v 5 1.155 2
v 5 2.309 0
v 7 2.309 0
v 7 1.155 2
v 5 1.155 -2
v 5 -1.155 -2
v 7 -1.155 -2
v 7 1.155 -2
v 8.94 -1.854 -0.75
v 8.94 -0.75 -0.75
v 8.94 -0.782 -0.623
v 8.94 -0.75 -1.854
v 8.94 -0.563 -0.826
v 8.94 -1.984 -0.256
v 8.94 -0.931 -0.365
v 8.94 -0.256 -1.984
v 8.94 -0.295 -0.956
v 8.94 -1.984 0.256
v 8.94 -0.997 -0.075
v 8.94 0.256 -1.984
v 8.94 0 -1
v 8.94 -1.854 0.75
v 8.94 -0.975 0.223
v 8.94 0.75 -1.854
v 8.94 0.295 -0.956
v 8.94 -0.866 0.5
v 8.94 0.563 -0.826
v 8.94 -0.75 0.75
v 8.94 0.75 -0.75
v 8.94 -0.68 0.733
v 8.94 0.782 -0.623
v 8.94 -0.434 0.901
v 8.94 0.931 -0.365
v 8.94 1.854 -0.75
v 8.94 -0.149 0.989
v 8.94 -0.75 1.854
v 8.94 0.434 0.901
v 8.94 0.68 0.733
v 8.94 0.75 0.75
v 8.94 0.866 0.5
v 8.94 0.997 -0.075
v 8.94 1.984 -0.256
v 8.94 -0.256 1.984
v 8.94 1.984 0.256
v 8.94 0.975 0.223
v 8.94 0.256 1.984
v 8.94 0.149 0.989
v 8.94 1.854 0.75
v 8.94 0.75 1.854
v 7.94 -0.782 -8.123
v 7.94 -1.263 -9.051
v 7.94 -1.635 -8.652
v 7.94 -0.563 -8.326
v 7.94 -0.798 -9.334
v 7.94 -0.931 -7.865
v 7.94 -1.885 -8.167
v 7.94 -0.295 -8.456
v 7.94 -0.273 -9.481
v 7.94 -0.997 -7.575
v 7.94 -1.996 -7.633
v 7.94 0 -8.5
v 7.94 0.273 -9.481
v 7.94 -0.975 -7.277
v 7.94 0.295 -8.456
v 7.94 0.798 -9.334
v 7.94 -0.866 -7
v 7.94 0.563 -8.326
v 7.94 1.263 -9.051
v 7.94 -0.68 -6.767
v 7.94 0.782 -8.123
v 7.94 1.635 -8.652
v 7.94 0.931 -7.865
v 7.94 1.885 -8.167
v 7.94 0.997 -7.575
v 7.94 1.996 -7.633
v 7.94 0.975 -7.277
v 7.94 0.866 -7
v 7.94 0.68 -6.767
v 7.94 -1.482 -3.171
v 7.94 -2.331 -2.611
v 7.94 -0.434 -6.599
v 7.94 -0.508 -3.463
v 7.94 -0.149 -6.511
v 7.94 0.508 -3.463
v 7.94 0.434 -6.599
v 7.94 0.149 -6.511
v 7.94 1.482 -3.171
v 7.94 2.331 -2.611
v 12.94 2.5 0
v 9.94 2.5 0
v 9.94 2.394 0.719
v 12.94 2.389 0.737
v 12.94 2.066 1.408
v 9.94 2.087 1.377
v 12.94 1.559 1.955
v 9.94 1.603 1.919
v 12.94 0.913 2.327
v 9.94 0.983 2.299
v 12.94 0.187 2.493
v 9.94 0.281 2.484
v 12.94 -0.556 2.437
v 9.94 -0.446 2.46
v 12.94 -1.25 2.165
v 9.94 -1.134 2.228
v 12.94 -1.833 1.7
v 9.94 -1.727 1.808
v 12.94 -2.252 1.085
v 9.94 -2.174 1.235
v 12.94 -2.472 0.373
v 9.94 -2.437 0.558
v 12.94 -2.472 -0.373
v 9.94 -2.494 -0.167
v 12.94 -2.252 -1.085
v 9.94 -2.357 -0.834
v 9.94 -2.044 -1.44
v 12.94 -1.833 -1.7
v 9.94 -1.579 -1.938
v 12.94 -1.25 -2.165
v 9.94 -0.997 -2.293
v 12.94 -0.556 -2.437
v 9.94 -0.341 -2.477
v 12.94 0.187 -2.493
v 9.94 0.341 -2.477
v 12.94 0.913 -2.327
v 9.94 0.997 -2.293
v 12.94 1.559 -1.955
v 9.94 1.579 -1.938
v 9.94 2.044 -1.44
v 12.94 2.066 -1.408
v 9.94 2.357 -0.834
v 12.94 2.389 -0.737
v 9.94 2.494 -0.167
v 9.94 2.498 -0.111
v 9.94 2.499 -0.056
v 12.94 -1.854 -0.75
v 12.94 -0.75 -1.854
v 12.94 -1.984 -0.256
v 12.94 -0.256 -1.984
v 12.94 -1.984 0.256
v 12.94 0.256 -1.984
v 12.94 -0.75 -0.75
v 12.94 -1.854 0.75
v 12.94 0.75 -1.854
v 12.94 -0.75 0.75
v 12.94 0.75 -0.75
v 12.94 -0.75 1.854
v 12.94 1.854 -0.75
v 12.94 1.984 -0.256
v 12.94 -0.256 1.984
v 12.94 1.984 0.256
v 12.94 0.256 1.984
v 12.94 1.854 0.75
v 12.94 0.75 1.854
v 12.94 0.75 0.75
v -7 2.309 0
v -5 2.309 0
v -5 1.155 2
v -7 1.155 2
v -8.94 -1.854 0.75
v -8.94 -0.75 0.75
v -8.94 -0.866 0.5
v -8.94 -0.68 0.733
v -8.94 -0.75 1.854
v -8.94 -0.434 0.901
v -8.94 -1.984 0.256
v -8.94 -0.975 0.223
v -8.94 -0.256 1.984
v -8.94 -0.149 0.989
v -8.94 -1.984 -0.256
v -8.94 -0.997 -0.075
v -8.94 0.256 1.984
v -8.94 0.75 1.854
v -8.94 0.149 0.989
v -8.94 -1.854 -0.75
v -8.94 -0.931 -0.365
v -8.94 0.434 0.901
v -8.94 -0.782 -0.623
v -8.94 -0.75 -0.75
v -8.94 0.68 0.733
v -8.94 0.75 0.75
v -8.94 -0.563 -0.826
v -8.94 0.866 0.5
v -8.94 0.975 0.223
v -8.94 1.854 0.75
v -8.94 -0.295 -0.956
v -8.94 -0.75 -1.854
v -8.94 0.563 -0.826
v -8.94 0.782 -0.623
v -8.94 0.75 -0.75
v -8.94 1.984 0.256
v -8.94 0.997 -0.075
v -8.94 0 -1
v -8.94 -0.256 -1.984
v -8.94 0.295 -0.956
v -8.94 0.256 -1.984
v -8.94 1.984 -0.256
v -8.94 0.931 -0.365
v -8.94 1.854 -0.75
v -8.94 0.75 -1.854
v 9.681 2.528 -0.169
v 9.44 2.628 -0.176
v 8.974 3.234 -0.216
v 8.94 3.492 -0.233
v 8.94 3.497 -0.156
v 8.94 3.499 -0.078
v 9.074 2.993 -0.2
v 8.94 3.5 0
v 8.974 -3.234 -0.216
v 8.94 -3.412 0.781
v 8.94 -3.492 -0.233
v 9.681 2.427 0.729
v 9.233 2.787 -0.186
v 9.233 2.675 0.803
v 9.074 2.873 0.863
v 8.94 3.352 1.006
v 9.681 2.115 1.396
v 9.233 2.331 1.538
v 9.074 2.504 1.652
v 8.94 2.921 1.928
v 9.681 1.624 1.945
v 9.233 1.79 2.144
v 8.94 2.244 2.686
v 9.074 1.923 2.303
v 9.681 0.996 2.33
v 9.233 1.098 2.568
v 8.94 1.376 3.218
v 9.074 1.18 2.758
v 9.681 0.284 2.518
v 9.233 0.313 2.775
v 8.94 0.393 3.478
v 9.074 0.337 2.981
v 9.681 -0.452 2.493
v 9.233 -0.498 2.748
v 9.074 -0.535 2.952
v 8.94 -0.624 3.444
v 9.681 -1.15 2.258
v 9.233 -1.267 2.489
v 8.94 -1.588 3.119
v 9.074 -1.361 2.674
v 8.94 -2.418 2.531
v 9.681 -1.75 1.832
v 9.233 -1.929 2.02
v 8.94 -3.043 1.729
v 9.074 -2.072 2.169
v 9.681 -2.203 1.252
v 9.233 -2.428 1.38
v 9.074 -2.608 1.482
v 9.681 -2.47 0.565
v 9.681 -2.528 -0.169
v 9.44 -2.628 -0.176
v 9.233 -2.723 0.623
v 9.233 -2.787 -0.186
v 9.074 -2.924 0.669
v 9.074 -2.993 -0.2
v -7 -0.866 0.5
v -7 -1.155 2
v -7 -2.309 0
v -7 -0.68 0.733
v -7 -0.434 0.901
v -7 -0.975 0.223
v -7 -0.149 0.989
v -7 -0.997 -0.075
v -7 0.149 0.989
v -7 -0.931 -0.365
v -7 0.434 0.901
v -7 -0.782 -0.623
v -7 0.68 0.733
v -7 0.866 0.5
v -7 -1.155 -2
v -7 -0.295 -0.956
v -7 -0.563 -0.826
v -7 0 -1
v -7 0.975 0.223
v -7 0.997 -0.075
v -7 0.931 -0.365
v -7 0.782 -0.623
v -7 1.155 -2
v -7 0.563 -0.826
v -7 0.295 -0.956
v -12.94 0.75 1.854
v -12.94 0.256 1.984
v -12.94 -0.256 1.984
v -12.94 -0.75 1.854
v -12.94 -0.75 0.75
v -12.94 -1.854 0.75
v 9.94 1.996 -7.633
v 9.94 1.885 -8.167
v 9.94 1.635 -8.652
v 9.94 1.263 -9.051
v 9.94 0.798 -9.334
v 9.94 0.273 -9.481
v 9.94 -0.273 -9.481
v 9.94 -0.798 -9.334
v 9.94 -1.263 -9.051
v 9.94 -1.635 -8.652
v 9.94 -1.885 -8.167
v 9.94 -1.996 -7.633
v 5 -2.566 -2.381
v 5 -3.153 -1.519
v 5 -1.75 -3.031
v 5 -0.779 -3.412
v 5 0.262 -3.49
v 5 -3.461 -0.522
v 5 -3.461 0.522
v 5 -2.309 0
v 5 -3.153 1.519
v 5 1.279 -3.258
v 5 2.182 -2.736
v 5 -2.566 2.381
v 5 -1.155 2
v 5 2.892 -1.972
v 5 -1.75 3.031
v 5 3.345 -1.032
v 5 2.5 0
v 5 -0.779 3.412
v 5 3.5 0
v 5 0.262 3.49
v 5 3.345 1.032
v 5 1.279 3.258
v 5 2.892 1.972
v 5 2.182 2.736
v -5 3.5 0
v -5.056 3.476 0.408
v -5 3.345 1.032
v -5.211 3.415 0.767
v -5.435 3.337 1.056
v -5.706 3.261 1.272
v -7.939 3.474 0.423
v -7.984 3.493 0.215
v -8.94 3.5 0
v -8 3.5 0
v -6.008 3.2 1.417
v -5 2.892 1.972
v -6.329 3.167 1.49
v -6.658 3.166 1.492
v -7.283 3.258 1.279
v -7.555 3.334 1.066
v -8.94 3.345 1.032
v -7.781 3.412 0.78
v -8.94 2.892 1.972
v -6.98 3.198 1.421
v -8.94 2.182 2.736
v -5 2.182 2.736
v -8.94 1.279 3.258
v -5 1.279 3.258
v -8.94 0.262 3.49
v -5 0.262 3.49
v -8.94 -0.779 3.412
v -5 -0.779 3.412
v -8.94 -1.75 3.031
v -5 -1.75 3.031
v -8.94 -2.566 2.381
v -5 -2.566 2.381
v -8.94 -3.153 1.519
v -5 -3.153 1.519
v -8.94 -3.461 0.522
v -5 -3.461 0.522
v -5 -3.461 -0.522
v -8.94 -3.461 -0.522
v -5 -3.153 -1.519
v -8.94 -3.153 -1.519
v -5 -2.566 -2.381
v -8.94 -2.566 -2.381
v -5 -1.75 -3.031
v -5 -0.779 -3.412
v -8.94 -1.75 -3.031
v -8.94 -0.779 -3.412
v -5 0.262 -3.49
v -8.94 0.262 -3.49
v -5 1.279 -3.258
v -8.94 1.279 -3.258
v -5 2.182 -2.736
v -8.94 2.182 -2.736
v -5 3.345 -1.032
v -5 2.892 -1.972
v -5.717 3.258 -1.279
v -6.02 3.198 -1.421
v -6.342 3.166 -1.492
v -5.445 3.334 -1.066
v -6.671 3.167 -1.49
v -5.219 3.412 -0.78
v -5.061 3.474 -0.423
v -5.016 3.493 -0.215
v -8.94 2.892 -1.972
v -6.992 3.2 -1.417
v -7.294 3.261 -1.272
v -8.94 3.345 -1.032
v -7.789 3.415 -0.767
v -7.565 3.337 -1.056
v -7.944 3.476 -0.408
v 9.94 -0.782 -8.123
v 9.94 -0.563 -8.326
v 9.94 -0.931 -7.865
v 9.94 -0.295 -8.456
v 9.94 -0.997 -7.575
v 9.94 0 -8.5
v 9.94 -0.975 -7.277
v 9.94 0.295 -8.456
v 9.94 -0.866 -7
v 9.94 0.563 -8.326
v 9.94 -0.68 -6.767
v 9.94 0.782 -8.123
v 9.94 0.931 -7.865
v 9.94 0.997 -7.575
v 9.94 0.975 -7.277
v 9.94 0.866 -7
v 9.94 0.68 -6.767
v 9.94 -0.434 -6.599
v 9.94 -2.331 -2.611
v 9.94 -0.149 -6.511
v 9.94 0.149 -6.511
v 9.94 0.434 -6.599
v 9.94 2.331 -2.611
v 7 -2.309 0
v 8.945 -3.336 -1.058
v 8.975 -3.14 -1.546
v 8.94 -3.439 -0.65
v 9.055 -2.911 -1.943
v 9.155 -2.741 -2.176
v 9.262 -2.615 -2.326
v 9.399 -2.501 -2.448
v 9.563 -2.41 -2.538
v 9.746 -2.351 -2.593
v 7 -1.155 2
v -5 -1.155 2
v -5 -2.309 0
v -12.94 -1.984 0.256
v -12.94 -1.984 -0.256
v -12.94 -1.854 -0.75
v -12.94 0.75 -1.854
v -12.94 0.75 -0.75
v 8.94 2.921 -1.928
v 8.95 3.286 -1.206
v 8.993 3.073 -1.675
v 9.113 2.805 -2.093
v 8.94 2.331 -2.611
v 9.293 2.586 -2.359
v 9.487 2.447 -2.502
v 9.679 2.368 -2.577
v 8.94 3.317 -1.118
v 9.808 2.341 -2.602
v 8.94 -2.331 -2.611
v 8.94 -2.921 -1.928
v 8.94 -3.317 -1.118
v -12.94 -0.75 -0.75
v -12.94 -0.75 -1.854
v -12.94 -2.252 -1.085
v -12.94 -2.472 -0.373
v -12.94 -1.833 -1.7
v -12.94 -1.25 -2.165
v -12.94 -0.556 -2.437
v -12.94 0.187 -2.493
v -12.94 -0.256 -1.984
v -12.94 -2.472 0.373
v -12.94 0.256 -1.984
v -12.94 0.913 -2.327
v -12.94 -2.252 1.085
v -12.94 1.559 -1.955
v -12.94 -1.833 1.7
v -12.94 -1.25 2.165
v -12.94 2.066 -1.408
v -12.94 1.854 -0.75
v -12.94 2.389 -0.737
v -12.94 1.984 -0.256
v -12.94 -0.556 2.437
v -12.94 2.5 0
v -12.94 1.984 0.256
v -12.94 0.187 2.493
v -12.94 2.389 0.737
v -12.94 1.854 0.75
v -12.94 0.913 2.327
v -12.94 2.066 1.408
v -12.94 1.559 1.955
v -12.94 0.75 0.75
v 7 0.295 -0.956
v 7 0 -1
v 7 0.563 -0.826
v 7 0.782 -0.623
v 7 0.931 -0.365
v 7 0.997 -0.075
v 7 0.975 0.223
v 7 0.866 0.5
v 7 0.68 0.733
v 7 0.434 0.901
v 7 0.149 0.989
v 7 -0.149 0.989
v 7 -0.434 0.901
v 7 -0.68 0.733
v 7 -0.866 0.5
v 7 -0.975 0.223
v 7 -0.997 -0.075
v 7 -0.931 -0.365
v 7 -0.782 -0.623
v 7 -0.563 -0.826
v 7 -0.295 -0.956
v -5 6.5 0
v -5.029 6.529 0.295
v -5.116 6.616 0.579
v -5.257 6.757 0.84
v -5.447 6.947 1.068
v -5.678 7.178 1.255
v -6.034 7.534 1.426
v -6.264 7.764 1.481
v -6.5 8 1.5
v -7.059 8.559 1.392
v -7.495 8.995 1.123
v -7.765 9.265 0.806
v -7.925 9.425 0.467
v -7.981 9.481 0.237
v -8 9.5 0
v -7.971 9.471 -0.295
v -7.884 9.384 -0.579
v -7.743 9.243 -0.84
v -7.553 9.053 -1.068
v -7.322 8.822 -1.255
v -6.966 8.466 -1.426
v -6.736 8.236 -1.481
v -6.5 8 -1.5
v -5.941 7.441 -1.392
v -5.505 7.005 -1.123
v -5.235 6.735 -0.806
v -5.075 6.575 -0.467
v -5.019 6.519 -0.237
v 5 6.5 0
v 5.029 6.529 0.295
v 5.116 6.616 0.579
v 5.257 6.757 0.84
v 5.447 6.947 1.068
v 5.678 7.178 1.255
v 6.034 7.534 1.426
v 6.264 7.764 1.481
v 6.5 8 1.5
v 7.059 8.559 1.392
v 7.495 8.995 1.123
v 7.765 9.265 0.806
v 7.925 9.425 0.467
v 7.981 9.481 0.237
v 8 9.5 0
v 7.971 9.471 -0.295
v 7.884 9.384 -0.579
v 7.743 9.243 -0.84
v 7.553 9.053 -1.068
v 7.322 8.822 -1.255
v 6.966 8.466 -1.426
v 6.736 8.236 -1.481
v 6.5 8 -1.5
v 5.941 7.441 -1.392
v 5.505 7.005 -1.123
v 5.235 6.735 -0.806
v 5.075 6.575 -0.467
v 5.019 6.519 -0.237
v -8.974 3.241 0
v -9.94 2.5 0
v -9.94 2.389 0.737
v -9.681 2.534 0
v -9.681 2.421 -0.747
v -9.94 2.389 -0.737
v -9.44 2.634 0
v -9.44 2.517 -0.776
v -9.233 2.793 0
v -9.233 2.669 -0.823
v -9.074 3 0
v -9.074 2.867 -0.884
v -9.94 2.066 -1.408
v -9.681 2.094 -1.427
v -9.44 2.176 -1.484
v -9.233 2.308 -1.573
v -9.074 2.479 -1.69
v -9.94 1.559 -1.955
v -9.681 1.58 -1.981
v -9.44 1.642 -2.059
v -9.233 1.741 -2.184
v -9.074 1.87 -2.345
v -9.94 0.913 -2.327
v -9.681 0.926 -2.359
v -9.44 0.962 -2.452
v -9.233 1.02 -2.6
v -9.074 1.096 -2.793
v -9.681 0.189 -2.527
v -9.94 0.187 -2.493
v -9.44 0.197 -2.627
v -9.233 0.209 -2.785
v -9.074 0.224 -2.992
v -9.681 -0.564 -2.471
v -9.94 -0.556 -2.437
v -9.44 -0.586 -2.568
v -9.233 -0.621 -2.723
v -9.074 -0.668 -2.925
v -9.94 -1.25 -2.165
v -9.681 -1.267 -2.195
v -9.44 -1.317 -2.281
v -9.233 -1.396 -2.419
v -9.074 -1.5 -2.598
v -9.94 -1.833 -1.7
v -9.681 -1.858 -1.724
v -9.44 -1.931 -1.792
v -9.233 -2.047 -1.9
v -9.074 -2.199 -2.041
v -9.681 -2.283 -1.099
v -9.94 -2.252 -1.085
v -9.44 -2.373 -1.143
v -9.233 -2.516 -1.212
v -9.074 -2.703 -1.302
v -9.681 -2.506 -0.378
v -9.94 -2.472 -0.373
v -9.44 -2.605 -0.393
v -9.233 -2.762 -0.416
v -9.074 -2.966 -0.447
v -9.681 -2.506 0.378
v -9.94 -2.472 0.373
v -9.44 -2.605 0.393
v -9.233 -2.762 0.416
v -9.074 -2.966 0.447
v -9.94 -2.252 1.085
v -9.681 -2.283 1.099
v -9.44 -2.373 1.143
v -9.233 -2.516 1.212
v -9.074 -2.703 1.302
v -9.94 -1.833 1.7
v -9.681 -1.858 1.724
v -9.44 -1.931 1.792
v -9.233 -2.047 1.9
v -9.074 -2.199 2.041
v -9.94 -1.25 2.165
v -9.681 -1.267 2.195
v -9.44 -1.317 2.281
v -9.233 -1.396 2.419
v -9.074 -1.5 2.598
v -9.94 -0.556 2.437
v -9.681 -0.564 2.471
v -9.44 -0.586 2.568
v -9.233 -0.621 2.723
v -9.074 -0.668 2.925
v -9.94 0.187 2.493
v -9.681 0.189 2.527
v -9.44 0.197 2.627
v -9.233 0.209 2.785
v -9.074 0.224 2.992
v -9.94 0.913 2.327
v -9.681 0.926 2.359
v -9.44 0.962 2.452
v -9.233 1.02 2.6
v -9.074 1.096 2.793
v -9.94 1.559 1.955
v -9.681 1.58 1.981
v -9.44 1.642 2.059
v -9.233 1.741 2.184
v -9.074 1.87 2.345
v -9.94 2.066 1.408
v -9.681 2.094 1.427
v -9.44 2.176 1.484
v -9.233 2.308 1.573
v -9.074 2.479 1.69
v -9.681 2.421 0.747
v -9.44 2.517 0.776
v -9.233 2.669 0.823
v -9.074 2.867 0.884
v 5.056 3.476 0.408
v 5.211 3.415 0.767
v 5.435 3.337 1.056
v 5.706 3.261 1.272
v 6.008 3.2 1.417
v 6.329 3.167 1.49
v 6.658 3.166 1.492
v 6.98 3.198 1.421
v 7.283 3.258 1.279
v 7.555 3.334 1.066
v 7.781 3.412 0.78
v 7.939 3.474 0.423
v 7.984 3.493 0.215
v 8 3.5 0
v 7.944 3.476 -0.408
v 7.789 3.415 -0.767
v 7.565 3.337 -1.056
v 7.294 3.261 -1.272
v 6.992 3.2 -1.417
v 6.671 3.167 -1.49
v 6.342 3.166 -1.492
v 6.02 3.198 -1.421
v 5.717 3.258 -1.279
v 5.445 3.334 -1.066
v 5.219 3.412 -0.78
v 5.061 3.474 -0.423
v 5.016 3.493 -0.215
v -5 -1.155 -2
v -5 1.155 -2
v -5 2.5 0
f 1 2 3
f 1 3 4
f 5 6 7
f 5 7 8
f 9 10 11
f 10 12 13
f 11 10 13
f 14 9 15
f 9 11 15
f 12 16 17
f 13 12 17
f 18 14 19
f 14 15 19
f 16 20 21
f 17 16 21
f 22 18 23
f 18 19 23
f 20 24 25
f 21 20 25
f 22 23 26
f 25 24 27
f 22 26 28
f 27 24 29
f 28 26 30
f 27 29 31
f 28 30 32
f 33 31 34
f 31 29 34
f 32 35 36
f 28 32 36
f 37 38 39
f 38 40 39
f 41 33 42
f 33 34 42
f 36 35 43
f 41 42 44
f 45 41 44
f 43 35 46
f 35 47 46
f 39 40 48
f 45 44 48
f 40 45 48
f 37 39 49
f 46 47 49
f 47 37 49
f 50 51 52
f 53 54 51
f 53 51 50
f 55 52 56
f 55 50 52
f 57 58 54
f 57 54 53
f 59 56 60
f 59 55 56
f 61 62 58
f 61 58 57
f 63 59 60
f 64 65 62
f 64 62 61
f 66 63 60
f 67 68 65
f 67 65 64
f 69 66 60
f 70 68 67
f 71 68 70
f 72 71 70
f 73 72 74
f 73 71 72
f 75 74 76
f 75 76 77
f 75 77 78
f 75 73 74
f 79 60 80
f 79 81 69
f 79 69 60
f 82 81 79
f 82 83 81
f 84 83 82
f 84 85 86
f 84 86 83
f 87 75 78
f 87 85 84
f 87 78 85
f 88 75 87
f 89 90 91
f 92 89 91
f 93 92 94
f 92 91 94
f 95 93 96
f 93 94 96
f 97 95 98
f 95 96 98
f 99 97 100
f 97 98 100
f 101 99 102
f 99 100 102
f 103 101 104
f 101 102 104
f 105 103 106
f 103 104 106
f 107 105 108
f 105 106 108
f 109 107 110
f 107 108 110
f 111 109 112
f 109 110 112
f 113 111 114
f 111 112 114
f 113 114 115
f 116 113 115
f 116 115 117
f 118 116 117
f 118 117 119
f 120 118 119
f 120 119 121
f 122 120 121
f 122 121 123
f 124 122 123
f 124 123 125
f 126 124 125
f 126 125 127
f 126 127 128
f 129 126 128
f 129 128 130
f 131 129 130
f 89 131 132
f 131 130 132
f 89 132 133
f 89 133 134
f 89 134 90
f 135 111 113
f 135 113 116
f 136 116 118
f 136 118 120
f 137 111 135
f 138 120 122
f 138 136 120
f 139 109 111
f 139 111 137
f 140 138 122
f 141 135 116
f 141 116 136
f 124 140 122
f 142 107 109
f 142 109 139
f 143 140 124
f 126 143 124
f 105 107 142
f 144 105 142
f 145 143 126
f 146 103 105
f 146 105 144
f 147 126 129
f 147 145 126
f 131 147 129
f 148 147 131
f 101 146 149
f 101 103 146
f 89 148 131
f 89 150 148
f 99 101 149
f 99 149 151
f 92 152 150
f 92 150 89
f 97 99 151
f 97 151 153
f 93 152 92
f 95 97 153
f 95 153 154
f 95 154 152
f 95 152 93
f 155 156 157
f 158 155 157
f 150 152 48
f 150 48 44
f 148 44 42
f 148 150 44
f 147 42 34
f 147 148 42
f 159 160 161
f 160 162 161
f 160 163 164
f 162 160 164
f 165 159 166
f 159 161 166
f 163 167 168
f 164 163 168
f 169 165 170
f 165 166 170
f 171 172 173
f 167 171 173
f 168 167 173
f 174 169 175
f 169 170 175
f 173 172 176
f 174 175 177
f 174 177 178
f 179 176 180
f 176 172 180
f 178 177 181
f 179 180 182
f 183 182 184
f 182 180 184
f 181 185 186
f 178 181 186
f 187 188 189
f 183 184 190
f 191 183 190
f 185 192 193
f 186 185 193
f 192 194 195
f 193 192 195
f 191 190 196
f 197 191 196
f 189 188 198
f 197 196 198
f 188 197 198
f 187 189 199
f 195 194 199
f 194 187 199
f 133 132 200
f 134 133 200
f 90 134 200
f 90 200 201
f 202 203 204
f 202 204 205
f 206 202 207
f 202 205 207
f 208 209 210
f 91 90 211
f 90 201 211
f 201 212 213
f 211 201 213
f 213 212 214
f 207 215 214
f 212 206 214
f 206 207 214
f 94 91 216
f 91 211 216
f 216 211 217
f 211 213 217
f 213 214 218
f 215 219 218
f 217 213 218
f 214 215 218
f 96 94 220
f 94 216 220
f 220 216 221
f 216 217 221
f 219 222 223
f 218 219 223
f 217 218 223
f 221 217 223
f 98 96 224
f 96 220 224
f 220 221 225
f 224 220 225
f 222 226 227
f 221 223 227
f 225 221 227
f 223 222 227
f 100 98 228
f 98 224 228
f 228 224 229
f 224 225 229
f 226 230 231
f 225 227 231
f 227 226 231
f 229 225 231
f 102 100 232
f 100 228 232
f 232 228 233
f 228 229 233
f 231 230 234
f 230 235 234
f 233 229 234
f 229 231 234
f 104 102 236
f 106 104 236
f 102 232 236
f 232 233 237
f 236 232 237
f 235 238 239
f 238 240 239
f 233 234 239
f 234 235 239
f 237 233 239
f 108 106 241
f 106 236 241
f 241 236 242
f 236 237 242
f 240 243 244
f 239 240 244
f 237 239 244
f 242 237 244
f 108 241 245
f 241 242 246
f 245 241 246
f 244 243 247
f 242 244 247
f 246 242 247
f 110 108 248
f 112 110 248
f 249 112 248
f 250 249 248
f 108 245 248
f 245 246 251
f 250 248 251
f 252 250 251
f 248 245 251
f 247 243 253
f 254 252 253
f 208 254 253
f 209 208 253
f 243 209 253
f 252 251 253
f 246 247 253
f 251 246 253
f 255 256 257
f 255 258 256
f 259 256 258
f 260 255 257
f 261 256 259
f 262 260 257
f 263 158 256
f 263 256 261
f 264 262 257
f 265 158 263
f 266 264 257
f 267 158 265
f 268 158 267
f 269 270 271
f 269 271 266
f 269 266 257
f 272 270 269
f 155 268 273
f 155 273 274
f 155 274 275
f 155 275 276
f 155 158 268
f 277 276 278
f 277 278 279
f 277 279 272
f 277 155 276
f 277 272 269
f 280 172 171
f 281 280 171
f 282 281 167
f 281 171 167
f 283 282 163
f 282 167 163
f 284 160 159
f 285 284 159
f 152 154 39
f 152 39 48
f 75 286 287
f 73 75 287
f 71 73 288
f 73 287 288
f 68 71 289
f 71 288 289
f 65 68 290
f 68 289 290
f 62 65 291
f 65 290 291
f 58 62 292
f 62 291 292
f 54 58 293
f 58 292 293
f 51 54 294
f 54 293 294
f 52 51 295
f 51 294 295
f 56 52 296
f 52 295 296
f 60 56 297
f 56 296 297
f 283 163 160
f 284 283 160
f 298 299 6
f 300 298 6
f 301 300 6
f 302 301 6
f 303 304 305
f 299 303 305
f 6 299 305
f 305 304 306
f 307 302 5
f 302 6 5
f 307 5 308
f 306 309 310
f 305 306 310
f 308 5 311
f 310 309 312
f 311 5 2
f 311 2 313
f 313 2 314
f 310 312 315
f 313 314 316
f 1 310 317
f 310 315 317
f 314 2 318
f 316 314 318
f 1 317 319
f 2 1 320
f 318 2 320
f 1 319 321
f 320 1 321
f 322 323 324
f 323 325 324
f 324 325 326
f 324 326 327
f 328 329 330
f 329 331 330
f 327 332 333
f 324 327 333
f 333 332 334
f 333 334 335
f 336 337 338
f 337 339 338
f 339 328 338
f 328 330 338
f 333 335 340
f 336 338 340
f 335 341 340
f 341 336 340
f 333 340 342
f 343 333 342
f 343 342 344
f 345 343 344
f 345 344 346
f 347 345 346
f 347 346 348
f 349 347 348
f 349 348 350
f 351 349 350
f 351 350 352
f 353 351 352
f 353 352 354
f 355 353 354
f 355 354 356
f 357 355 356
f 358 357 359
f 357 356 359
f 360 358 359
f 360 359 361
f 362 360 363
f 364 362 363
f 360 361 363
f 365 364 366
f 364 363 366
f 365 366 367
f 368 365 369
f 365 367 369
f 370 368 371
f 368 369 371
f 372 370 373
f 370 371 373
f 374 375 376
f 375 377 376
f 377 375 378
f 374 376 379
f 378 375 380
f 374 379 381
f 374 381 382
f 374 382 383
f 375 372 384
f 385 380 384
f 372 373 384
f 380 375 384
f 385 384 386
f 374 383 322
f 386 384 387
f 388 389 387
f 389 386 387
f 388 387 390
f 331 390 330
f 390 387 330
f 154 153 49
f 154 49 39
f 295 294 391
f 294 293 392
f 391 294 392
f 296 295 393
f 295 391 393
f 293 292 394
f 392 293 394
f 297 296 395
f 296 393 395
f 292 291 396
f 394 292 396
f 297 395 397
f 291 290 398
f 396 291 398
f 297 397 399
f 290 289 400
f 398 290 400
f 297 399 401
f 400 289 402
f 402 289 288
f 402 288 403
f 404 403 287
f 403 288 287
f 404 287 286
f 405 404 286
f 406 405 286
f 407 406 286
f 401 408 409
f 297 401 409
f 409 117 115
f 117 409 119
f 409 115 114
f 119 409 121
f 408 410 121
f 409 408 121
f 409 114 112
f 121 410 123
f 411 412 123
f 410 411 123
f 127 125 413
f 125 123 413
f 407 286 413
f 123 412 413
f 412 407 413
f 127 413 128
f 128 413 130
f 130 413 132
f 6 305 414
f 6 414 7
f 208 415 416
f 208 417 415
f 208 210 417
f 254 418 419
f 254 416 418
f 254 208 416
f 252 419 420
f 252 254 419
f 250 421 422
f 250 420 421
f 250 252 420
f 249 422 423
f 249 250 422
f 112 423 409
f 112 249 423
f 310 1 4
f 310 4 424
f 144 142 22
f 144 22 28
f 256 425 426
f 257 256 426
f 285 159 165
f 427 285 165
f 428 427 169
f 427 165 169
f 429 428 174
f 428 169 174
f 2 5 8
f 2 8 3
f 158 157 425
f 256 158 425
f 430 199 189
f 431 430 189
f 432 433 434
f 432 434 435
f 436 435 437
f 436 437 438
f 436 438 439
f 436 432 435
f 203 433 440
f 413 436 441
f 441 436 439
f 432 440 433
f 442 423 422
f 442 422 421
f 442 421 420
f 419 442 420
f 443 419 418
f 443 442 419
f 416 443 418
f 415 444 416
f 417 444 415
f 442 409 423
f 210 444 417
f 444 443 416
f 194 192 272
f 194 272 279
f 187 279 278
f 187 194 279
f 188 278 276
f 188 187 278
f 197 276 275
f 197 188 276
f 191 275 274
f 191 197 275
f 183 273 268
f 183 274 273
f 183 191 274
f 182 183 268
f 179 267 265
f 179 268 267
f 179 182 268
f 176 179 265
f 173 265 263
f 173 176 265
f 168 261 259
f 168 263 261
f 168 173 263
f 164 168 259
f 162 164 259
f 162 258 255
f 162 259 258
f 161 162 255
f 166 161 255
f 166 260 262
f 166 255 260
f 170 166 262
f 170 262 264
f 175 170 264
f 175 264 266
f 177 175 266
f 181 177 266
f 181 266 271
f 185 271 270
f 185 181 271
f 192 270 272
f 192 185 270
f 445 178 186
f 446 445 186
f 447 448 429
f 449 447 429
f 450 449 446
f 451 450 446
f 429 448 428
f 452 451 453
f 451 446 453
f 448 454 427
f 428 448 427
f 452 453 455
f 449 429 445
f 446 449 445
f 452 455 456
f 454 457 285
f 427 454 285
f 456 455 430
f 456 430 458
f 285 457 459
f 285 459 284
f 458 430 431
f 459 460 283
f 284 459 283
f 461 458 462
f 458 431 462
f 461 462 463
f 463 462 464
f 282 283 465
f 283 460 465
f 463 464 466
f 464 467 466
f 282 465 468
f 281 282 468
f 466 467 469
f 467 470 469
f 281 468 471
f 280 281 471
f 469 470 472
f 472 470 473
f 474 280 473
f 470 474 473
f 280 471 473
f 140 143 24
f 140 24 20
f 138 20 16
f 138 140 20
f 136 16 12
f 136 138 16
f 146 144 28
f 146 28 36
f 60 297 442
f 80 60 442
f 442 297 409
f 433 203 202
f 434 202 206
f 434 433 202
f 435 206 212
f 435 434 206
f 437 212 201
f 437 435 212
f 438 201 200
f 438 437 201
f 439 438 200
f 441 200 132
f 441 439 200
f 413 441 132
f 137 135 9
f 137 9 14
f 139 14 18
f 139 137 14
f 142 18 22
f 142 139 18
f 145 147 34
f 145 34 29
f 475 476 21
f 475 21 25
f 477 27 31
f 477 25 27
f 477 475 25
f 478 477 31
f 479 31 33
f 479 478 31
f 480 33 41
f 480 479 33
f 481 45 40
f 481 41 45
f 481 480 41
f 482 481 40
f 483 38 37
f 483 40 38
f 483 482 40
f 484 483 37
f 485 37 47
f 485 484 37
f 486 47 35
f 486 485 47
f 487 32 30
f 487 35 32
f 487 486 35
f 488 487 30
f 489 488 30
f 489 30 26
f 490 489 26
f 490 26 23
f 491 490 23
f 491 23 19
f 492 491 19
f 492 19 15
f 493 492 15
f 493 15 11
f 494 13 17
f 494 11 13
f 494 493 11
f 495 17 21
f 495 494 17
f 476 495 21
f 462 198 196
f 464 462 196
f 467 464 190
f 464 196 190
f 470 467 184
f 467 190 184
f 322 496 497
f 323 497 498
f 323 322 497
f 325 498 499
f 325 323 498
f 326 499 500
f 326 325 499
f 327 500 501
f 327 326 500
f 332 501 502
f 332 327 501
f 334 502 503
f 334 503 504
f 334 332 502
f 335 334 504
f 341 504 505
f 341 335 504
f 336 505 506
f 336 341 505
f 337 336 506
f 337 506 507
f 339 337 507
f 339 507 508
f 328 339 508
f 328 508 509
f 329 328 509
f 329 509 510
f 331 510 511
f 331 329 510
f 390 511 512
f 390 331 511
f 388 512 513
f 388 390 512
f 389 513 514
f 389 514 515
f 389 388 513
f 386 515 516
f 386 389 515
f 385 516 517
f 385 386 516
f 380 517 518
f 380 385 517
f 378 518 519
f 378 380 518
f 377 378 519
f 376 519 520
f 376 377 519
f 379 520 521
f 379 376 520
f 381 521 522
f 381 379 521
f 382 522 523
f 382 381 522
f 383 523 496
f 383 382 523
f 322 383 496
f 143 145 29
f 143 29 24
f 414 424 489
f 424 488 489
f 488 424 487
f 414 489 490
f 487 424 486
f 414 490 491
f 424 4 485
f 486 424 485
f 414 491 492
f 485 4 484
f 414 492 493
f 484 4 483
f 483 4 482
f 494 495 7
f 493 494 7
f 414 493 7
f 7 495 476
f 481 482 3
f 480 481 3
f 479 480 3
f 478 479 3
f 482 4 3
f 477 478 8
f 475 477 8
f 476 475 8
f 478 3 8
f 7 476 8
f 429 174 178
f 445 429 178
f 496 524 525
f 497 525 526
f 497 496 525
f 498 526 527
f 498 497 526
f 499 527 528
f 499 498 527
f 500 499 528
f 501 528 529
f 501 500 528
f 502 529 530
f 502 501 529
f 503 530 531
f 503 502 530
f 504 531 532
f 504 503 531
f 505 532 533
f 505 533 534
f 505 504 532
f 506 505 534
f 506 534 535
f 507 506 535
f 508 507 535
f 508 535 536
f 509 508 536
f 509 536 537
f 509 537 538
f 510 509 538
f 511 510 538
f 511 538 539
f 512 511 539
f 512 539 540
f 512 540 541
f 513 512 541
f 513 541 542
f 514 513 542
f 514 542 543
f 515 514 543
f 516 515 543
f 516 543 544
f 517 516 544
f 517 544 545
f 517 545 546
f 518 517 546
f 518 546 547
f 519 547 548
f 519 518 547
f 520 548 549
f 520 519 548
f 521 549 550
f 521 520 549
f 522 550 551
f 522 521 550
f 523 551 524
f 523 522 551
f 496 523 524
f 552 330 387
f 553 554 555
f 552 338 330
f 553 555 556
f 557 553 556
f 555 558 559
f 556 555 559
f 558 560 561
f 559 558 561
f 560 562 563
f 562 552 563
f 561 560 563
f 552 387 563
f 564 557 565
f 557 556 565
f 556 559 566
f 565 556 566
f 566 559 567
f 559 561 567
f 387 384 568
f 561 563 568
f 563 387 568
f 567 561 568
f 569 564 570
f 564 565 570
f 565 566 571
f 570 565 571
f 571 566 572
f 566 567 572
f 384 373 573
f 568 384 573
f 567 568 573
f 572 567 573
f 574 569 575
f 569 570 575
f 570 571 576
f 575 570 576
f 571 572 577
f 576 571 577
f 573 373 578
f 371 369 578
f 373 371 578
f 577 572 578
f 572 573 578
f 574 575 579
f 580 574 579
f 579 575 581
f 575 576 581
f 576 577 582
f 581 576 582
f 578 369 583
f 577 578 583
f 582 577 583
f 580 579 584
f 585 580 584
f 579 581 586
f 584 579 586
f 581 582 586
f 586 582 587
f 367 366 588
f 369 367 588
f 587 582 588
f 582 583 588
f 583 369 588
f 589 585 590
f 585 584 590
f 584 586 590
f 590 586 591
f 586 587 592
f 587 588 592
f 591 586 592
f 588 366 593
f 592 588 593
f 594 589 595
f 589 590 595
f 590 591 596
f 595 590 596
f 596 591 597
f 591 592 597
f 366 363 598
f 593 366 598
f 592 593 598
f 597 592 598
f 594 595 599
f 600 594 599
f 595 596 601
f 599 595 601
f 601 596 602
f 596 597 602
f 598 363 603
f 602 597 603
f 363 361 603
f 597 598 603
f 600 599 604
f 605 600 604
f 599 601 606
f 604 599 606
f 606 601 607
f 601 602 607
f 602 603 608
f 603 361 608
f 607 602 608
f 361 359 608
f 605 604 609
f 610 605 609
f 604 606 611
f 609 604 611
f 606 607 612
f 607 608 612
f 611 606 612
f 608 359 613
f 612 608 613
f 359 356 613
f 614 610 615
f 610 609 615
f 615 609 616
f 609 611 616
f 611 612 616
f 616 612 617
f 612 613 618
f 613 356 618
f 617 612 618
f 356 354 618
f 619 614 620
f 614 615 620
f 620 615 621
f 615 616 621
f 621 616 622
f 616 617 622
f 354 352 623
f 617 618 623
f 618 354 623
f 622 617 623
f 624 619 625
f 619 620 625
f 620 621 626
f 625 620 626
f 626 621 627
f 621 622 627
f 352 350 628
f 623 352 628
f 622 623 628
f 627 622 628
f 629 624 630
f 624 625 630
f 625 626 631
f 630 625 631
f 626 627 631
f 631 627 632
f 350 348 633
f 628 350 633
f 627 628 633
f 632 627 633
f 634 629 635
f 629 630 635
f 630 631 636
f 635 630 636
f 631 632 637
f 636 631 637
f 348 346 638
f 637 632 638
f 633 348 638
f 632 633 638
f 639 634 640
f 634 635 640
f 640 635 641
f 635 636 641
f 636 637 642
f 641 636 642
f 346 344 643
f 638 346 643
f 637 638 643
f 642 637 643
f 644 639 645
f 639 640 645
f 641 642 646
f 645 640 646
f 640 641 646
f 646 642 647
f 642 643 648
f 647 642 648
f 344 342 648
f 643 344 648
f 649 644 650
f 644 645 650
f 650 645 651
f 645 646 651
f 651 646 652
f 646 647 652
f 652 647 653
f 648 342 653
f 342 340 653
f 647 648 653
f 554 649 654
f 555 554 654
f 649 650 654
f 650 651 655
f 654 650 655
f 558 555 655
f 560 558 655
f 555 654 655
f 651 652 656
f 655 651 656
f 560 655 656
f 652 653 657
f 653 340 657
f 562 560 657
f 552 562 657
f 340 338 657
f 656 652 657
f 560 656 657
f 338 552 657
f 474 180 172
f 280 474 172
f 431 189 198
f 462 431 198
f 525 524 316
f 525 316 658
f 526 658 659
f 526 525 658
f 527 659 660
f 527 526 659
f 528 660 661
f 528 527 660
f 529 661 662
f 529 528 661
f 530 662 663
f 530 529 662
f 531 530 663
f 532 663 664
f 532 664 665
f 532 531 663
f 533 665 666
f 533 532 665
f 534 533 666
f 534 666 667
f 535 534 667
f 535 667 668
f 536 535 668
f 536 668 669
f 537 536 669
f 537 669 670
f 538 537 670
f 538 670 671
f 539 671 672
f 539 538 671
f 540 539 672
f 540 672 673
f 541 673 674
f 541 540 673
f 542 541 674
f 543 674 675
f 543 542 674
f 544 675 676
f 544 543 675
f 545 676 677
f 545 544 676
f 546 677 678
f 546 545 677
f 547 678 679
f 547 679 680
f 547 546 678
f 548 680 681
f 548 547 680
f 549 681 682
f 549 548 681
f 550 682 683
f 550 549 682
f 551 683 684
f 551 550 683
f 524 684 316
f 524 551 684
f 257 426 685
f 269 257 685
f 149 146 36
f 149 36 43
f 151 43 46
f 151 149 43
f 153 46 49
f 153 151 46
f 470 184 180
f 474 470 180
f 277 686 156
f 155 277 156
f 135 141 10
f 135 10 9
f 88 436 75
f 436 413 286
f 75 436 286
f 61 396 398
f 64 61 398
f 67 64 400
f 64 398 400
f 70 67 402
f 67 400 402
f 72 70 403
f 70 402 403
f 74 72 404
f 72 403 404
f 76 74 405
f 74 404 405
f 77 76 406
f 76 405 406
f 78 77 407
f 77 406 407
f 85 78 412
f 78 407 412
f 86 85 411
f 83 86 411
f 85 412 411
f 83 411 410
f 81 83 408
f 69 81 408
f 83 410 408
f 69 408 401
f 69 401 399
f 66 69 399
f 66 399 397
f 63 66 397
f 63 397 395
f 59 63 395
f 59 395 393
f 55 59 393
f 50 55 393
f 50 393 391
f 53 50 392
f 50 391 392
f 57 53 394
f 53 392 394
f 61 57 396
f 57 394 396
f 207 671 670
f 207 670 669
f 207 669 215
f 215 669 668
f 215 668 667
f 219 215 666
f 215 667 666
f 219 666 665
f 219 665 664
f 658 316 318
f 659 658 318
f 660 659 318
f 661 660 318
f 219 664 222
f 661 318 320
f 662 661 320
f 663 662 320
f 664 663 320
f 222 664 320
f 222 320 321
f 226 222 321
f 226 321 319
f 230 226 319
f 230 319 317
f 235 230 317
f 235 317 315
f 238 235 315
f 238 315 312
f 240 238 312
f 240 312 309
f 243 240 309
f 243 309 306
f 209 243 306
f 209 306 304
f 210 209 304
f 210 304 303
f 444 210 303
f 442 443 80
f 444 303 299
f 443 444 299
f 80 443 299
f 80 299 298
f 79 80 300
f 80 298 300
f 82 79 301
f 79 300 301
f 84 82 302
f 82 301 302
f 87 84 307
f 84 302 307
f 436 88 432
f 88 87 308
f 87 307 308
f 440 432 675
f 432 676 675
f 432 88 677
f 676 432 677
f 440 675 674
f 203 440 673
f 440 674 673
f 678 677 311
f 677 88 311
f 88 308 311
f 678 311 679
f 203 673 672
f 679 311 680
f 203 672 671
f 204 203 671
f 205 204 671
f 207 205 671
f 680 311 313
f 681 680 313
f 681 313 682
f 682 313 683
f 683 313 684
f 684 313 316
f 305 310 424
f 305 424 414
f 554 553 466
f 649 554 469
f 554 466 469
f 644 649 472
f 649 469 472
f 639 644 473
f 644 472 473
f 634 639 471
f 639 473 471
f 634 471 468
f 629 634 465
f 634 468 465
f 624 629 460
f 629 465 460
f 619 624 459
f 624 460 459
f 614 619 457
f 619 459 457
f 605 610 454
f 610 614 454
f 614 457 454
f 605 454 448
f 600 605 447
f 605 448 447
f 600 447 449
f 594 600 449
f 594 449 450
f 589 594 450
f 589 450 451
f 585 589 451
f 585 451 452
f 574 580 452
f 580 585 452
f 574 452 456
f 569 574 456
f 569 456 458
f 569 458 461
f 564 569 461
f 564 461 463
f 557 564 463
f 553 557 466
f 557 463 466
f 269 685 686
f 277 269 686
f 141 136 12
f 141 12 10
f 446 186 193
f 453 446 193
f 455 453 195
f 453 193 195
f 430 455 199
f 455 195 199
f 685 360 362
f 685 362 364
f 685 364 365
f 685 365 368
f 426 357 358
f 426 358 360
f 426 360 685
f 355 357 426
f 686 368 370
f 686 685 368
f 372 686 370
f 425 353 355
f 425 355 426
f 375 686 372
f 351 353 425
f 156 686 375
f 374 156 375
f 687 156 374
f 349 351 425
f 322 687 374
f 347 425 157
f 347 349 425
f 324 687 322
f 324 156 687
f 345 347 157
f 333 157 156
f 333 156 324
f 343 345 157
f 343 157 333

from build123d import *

# Parameters (mm, degrees)
SWEEP_1_PROFILE_R        = 1.5
EXTRUDE_1_DEPTH          = 3.44
EXTRUDE_1_DEPTH_BACK     = 4.5
EXTRUDE_1_START          = 9.5
SKETCH_8_R               = 2.5
EXTRUDE_2_DEPTH          = 4.5
EXTRUDE_2_DEPTH_BACK     = 3.44
EXTRUDE_2_START          = -9.5
SKETCH_9_R               = 2.5
EXTRUDE_START            = 9.94
SKETCH_14_R              = 1
EXTRUDE_3_DEPTH          = 2
CUT_EXTRUDE_START        = 12.94
CUT_EXTRUDE_1_DEPTH      = 4
CUT_EXTRUDE_START_2      = -8.94
CUT_EXTRUDE_2_DEPTH      = 4
SKETCH_16_R              = 0.25
CUT_EXTRUDE_3_DEPTH      = 0.25
CUT_EXTRUDE_START_3      = 8.69
SKETCH_17_R              = 0.25
CUT_EXTRUDE_4_DEPTH      = 0.25
EXTRUDE_START_2          = 5
SKETCH_18_R              = 3.5
EXTRUDE_4_DEPTH          = 3.94
EXTRUDE_START_3          = -8.94
SKETCH_20_R              = 3.5
EXTRUDE_5_DEPTH          = 3.94
CUT_EXTRUDE_6_DEPTH      = 19.653246417
CUT_EXTRUDE_6_DEPTH_BACK = 19.653246417
SKETCH_25_R              = 1
FILLET_1_R               = 1
CUT_EXTRUDE_START_4      = -5
CUT_EXTRUDE_7_DEPTH      = 2
CUT_EXTRUDE_START_5      = 5
CUT_EXTRUDE_8_DEPTH      = 2


with BuildPart() as part:
    # 扫描1: sweep along a path in 草图1
    with BuildLine(Plane.XY) as sweep_1_path:
        Line((9.5, 0), (6.5, 0))
        Line((6.5, 0), (6.5, 8))
        Line((6.5, 8), (-6.5, 8))
        Line((-6.5, 8), (-6.5, 0))
        Line((-6.5, 0), (-9.5, 0))
    # 扫描1 profile (on start of the path) → 扫描1 (sweep)
    with BuildSketch(Plane(origin=(9.5, 0, 0), x_dir=(0, -1, 0), z_dir=(-1, 0, 0))):
        Circle(SWEEP_1_PROFILE_R)
    sweep(path=sweep_1_path.line, transition=Transition.RIGHT)

    # 草图8 → 凸台-拉伸1 (add, two sides: drawn at the far end of the back side and taken through both)
    with BuildSketch(Plane(origin=(0, 0, 0), x_dir=(0, 0, -1), z_dir=(1, 0, 0)).offset(EXTRUDE_1_START - EXTRUDE_1_DEPTH_BACK)):
        with Locations(Location((0, 0, 0), (0, 0, 90))):
            Circle(SKETCH_8_R)
    extrude(amount=EXTRUDE_1_DEPTH + EXTRUDE_1_DEPTH_BACK)

    # 草图9 → 凸台-拉伸2 (add, two sides: drawn at the far end of the back side and taken through both)
    with BuildSketch(Plane(origin=(0, 0, 0), x_dir=(0, 0, -1), z_dir=(1, 0, 0)).offset(EXTRUDE_2_START - EXTRUDE_2_DEPTH_BACK)):
        with Locations(Location((0, 0, 0), (0, 0, 90))):
            Circle(SKETCH_9_R)
    extrude(amount=EXTRUDE_2_DEPTH + EXTRUDE_2_DEPTH_BACK)

    # 草图14 → 凸台-拉伸3 (add)
    with BuildSketch(Plane(origin=(0, 0, 0), x_dir=(0, 0, -1), z_dir=(1, 0, 0)).offset(EXTRUDE_START)):
        with BuildLine():
            Line((0.166666667, 2.494438258), (7.633333333, 1.995550606))
            ThreePointArc((7.633333333, 1.995550606), (9.5, 0), (7.633333333, -1.995550606))
            Line((7.633333333, -1.995550606), (0.166666667, -2.494438258))
            ThreePointArc((0.166666667, -2.494438258), (-2.5, 0), (0.166666667, 2.494438258))
        make_face()
        with Locations((7.5, 0)):
            Circle(SKETCH_14_R, mode=Mode.SUBTRACT)
    extrude(amount=-EXTRUDE_3_DEPTH)

    # 草图10 → 切除-拉伸1 (cut)
    with BuildSketch(Plane(origin=(0, 0, 0), x_dir=(0, 0, -1), z_dir=(1, 0, 0)).offset(CUT_EXTRUDE_START)):
        with BuildLine():
            Line((0.75, 0.75), (1.854049622, 0.75))
            ThreePointArc((1.854049622, 0.75), (2, 0), (1.854049622, -0.75))
            Line((1.854049622, -0.75), (0.75, -0.75))
            Line((0.75, -0.75), (0.75, -1.854049622))
            ThreePointArc((0.75, -1.854049622), (0, -2), (-0.75, -1.854049622))
            Line((-0.75, -1.854049622), (-0.75, -0.75))
            Line((-0.75, -0.75), (-1.854049622, -0.75))
            ThreePointArc((-1.854049622, -0.75), (-2, 0), (-1.854049622, 0.75))
            Line((-1.854049622, 0.75), (-0.75, 0.75))
            Line((-0.75, 0.75), (-0.75, 1.854049622))
            ThreePointArc((-0.75, 1.854049622), (0, 2), (0.75, 1.854049622))
            Line((0.75, 1.854049622), (0.75, 0.75))
        make_face()
    extrude(amount=-CUT_EXTRUDE_1_DEPTH, mode=Mode.SUBTRACT)

    # 草图11 → 切除-拉伸2 (cut)
    with BuildSketch(Plane(origin=(0, 0, 0), x_dir=(0, 0, -1), z_dir=(1, 0, 0)).offset(CUT_EXTRUDE_START_2)):
        with BuildLine():
            Line((0.75, 0.75), (0.75, 1.854049622))
            ThreePointArc((0.75, 1.854049622), (0, 2), (-0.75, 1.854049622))
            Line((-0.75, 1.854049622), (-0.75, 0.75))
            Line((-0.75, 0.75), (-1.854049622, 0.75))
            ThreePointArc((-1.854049622, 0.75), (-2, 0), (-1.854049622, -0.75))
            Line((-1.854049622, -0.75), (-0.75, -0.75))
            Line((-0.75, -0.75), (-0.75, -1.854049622))
            ThreePointArc((-0.75, -1.854049622), (0, -2), (0.75, -1.854049622))
            Line((0.75, -1.854049622), (0.75, -0.75))
            Line((0.75, -0.75), (1.854049622, -0.75))
            ThreePointArc((1.854049622, -0.75), (2, 0), (1.854049622, 0.75))
            Line((1.854049622, 0.75), (0.75, 0.75))
        make_face()
    extrude(amount=-CUT_EXTRUDE_2_DEPTH, mode=Mode.SUBTRACT)

    # 草图16 → 切除-拉伸3 (cut)
    with BuildSketch(Plane(origin=(0, 0, 0), x_dir=(0, 0, -1), z_dir=(1, 0, 0)).offset(CUT_EXTRUDE_START_2)):
        with Locations(Location((0.75, 0, 0), (0, 0, 90))):
            Circle(SKETCH_16_R)
    extrude(amount=CUT_EXTRUDE_3_DEPTH, mode=Mode.SUBTRACT)

    # 草图17 → 切除-拉伸4 (cut)
    with BuildSketch(Plane(origin=(0, 0, 0), x_dir=(0, 0, -1), z_dir=(1, 0, 0)).offset(CUT_EXTRUDE_START_3)):
        with Locations(Location((0.75, 0, 0), (0, 0, 90))):
            Circle(SKETCH_17_R)
    extrude(amount=CUT_EXTRUDE_4_DEPTH, mode=Mode.SUBTRACT)

    # 草图18 → 凸台-拉伸4 (add)
    with BuildSketch(Plane(origin=(0, 0, 0), x_dir=(0, 0, -1), z_dir=(1, 0, 0)).offset(EXTRUDE_START_2)):
        with Locations(Location((0, 0, 0), (0, 0, 90))):
            Circle(SKETCH_18_R)
    extrude(amount=EXTRUDE_4_DEPTH)

    # 草图20 → 凸台-拉伸5 (add)
    with BuildSketch(Plane(origin=(0, 0, 0), x_dir=(0, 0, -1), z_dir=(1, 0, 0)).offset(EXTRUDE_START_3)):
        with Locations(Location((0, 0, 0), (0, 0, 90))):
            Circle(SKETCH_20_R)
    extrude(amount=EXTRUDE_5_DEPTH)

    # 草图25 → 切除-拉伸6 (cut, two sides: drawn at the far end of the back side and taken through both)
    with BuildSketch(Plane(origin=(0, 0, 0), x_dir=(0, 0, -1), z_dir=(1, 0, 0)).offset(-CUT_EXTRUDE_6_DEPTH_BACK)):
        Circle(SKETCH_25_R)
    extrude(amount=CUT_EXTRUDE_6_DEPTH + CUT_EXTRUDE_6_DEPTH_BACK, mode=Mode.SUBTRACT)

    # 圆角1
    # the kernel refuses this fillet: 1 mm, written as the material it adds along each edge
    with BuildSketch(Plane(origin=(-8.94, 0, 0), x_dir=(0, 1, 0), z_dir=(0, 0, 1))) as fillet_1_piece_1:
        with BuildLine():
            CenterArc((2.5 + FILLET_1_R, FILLET_1_R), FILLET_1_R, 180, 90)
            Line((2.5, FILLET_1_R), (2.5, 0))
            Line((2.5, 0), (2.5 + FILLET_1_R, 0))
        make_face()
    revolve(axis=Axis((-8.94, 0, 0), (-1, 0, 0)))
    with BuildSketch(Plane(origin=(8.94, 0, 0), x_dir=(0, 1, 0), z_dir=(0, 0, -1))) as fillet_1_piece_2:
        with BuildLine():
            CenterArc((2.5 + FILLET_1_R, FILLET_1_R), FILLET_1_R, 180, 90)
            Line((2.5 + FILLET_1_R, 0), (2.5, 0))
            Line((2.5, 0), (2.5, FILLET_1_R))
        make_face()
    revolve(axis=Axis((8.94, 0, 0), (1, 0, 0)), revolution_arc=183.822553729)
    with BuildSketch(Plane(origin=(8.94, -2.494438258, -0.166666667), x_dir=(1, 0, 0), z_dir=(0, 0.06666666666666658, -0.9977753031397177))) as fillet_1_piece_3_section:
        with BuildLine():
            CenterArc((FILLET_1_R, FILLET_1_R), FILLET_1_R, 180, 90)
            Line((0, FILLET_1_R), (0, 0))
            Line((0, 0), (FILLET_1_R, 0))
        make_face()
    fillet_1_piece_3 = extrude(amount=4.949489743, mode=Mode.PRIVATE)
    fillet_1_piece_3 = fillet_1_piece_3 & Plane(origin=(9.184299624, 0, 0), x_dir=(0, 1, 0), z_dir=(-1, 0, 0)) * Cylinder(3.5, 14, mode=Mode.PRIVATE)
    add(fillet_1_piece_3)
    with BuildSketch(Plane(origin=(8.94, 2.164472275, -5.105145295), x_dir=(0, 0.9977753031397177, -0.0666666666666666), z_dir=(0, 0.06666666666666658, 0.9977753031397177))) as fillet_1_piece_4_section:
        with BuildLine():
            CenterArc((FILLET_1_R, -FILLET_1_R), FILLET_1_R, 90, 90)
            Line((0, -FILLET_1_R), (0, 0))
            Line((0, 0), (FILLET_1_R, 0))
        make_face()
    fillet_1_piece_4 = extrude(amount=4.949489743, mode=Mode.PRIVATE)
    fillet_1_piece_4 = fillet_1_piece_4 & Plane(origin=(9.184299625, 0, 0), x_dir=(0, 1, 0), z_dir=(-1, 0, 0)) * Cylinder(3.5, 14, mode=Mode.PRIVATE)
    add(fillet_1_piece_4)
    with BuildSketch(Plane(origin=(8.94, 0, 0), x_dir=(0, 0.9977753030864385, -0.06666666746407793), z_dir=(0, -0.06666666746407793, -0.9977753030864385))) as fillet_1_piece_5:
        with BuildLine():
            CenterArc((2.5 + FILLET_1_R, FILLET_1_R), FILLET_1_R, 180, 90)
            Line((2.5, FILLET_1_R), (2.5, 0))
            Line((2.5, 0), (2.5 + FILLET_1_R, 0))
        make_face()
    revolve(axis=Axis((8.94, 0, 0), (1, 0, 0)), revolution_arc=3.822553775)

    # 草图26 → 切除-拉伸7 (cut)
    with BuildSketch(Plane(origin=(0, 0, 0), x_dir=(0, 0, -1), z_dir=(1, 0, 0)).offset(CUT_EXTRUDE_START_4)):
        Polygon((0, -2.309401077), (2, -1.154700538), (2, 1.154700538), (0, 2.309401077), (-2, 1.154700538), (-2, -1.154700538), align=None)
    extrude(amount=-CUT_EXTRUDE_7_DEPTH, mode=Mode.SUBTRACT)

    # 草图27 → 切除-拉伸8 (cut)
    with BuildSketch(Plane(origin=(0, 0, 0), x_dir=(0, 0, -1), z_dir=(1, 0, 0)).offset(CUT_EXTRUDE_START_5)):
        Polygon((0, -2.309401077), (2, -1.154700538), (2, 1.154700538), (0, 2.309401077), (-2, 1.154700538), (-2, -1.154700538), align=None)
    extrude(amount=CUT_EXTRUDE_8_DEPTH, mode=Mode.SUBTRACT)


solid = part.part
